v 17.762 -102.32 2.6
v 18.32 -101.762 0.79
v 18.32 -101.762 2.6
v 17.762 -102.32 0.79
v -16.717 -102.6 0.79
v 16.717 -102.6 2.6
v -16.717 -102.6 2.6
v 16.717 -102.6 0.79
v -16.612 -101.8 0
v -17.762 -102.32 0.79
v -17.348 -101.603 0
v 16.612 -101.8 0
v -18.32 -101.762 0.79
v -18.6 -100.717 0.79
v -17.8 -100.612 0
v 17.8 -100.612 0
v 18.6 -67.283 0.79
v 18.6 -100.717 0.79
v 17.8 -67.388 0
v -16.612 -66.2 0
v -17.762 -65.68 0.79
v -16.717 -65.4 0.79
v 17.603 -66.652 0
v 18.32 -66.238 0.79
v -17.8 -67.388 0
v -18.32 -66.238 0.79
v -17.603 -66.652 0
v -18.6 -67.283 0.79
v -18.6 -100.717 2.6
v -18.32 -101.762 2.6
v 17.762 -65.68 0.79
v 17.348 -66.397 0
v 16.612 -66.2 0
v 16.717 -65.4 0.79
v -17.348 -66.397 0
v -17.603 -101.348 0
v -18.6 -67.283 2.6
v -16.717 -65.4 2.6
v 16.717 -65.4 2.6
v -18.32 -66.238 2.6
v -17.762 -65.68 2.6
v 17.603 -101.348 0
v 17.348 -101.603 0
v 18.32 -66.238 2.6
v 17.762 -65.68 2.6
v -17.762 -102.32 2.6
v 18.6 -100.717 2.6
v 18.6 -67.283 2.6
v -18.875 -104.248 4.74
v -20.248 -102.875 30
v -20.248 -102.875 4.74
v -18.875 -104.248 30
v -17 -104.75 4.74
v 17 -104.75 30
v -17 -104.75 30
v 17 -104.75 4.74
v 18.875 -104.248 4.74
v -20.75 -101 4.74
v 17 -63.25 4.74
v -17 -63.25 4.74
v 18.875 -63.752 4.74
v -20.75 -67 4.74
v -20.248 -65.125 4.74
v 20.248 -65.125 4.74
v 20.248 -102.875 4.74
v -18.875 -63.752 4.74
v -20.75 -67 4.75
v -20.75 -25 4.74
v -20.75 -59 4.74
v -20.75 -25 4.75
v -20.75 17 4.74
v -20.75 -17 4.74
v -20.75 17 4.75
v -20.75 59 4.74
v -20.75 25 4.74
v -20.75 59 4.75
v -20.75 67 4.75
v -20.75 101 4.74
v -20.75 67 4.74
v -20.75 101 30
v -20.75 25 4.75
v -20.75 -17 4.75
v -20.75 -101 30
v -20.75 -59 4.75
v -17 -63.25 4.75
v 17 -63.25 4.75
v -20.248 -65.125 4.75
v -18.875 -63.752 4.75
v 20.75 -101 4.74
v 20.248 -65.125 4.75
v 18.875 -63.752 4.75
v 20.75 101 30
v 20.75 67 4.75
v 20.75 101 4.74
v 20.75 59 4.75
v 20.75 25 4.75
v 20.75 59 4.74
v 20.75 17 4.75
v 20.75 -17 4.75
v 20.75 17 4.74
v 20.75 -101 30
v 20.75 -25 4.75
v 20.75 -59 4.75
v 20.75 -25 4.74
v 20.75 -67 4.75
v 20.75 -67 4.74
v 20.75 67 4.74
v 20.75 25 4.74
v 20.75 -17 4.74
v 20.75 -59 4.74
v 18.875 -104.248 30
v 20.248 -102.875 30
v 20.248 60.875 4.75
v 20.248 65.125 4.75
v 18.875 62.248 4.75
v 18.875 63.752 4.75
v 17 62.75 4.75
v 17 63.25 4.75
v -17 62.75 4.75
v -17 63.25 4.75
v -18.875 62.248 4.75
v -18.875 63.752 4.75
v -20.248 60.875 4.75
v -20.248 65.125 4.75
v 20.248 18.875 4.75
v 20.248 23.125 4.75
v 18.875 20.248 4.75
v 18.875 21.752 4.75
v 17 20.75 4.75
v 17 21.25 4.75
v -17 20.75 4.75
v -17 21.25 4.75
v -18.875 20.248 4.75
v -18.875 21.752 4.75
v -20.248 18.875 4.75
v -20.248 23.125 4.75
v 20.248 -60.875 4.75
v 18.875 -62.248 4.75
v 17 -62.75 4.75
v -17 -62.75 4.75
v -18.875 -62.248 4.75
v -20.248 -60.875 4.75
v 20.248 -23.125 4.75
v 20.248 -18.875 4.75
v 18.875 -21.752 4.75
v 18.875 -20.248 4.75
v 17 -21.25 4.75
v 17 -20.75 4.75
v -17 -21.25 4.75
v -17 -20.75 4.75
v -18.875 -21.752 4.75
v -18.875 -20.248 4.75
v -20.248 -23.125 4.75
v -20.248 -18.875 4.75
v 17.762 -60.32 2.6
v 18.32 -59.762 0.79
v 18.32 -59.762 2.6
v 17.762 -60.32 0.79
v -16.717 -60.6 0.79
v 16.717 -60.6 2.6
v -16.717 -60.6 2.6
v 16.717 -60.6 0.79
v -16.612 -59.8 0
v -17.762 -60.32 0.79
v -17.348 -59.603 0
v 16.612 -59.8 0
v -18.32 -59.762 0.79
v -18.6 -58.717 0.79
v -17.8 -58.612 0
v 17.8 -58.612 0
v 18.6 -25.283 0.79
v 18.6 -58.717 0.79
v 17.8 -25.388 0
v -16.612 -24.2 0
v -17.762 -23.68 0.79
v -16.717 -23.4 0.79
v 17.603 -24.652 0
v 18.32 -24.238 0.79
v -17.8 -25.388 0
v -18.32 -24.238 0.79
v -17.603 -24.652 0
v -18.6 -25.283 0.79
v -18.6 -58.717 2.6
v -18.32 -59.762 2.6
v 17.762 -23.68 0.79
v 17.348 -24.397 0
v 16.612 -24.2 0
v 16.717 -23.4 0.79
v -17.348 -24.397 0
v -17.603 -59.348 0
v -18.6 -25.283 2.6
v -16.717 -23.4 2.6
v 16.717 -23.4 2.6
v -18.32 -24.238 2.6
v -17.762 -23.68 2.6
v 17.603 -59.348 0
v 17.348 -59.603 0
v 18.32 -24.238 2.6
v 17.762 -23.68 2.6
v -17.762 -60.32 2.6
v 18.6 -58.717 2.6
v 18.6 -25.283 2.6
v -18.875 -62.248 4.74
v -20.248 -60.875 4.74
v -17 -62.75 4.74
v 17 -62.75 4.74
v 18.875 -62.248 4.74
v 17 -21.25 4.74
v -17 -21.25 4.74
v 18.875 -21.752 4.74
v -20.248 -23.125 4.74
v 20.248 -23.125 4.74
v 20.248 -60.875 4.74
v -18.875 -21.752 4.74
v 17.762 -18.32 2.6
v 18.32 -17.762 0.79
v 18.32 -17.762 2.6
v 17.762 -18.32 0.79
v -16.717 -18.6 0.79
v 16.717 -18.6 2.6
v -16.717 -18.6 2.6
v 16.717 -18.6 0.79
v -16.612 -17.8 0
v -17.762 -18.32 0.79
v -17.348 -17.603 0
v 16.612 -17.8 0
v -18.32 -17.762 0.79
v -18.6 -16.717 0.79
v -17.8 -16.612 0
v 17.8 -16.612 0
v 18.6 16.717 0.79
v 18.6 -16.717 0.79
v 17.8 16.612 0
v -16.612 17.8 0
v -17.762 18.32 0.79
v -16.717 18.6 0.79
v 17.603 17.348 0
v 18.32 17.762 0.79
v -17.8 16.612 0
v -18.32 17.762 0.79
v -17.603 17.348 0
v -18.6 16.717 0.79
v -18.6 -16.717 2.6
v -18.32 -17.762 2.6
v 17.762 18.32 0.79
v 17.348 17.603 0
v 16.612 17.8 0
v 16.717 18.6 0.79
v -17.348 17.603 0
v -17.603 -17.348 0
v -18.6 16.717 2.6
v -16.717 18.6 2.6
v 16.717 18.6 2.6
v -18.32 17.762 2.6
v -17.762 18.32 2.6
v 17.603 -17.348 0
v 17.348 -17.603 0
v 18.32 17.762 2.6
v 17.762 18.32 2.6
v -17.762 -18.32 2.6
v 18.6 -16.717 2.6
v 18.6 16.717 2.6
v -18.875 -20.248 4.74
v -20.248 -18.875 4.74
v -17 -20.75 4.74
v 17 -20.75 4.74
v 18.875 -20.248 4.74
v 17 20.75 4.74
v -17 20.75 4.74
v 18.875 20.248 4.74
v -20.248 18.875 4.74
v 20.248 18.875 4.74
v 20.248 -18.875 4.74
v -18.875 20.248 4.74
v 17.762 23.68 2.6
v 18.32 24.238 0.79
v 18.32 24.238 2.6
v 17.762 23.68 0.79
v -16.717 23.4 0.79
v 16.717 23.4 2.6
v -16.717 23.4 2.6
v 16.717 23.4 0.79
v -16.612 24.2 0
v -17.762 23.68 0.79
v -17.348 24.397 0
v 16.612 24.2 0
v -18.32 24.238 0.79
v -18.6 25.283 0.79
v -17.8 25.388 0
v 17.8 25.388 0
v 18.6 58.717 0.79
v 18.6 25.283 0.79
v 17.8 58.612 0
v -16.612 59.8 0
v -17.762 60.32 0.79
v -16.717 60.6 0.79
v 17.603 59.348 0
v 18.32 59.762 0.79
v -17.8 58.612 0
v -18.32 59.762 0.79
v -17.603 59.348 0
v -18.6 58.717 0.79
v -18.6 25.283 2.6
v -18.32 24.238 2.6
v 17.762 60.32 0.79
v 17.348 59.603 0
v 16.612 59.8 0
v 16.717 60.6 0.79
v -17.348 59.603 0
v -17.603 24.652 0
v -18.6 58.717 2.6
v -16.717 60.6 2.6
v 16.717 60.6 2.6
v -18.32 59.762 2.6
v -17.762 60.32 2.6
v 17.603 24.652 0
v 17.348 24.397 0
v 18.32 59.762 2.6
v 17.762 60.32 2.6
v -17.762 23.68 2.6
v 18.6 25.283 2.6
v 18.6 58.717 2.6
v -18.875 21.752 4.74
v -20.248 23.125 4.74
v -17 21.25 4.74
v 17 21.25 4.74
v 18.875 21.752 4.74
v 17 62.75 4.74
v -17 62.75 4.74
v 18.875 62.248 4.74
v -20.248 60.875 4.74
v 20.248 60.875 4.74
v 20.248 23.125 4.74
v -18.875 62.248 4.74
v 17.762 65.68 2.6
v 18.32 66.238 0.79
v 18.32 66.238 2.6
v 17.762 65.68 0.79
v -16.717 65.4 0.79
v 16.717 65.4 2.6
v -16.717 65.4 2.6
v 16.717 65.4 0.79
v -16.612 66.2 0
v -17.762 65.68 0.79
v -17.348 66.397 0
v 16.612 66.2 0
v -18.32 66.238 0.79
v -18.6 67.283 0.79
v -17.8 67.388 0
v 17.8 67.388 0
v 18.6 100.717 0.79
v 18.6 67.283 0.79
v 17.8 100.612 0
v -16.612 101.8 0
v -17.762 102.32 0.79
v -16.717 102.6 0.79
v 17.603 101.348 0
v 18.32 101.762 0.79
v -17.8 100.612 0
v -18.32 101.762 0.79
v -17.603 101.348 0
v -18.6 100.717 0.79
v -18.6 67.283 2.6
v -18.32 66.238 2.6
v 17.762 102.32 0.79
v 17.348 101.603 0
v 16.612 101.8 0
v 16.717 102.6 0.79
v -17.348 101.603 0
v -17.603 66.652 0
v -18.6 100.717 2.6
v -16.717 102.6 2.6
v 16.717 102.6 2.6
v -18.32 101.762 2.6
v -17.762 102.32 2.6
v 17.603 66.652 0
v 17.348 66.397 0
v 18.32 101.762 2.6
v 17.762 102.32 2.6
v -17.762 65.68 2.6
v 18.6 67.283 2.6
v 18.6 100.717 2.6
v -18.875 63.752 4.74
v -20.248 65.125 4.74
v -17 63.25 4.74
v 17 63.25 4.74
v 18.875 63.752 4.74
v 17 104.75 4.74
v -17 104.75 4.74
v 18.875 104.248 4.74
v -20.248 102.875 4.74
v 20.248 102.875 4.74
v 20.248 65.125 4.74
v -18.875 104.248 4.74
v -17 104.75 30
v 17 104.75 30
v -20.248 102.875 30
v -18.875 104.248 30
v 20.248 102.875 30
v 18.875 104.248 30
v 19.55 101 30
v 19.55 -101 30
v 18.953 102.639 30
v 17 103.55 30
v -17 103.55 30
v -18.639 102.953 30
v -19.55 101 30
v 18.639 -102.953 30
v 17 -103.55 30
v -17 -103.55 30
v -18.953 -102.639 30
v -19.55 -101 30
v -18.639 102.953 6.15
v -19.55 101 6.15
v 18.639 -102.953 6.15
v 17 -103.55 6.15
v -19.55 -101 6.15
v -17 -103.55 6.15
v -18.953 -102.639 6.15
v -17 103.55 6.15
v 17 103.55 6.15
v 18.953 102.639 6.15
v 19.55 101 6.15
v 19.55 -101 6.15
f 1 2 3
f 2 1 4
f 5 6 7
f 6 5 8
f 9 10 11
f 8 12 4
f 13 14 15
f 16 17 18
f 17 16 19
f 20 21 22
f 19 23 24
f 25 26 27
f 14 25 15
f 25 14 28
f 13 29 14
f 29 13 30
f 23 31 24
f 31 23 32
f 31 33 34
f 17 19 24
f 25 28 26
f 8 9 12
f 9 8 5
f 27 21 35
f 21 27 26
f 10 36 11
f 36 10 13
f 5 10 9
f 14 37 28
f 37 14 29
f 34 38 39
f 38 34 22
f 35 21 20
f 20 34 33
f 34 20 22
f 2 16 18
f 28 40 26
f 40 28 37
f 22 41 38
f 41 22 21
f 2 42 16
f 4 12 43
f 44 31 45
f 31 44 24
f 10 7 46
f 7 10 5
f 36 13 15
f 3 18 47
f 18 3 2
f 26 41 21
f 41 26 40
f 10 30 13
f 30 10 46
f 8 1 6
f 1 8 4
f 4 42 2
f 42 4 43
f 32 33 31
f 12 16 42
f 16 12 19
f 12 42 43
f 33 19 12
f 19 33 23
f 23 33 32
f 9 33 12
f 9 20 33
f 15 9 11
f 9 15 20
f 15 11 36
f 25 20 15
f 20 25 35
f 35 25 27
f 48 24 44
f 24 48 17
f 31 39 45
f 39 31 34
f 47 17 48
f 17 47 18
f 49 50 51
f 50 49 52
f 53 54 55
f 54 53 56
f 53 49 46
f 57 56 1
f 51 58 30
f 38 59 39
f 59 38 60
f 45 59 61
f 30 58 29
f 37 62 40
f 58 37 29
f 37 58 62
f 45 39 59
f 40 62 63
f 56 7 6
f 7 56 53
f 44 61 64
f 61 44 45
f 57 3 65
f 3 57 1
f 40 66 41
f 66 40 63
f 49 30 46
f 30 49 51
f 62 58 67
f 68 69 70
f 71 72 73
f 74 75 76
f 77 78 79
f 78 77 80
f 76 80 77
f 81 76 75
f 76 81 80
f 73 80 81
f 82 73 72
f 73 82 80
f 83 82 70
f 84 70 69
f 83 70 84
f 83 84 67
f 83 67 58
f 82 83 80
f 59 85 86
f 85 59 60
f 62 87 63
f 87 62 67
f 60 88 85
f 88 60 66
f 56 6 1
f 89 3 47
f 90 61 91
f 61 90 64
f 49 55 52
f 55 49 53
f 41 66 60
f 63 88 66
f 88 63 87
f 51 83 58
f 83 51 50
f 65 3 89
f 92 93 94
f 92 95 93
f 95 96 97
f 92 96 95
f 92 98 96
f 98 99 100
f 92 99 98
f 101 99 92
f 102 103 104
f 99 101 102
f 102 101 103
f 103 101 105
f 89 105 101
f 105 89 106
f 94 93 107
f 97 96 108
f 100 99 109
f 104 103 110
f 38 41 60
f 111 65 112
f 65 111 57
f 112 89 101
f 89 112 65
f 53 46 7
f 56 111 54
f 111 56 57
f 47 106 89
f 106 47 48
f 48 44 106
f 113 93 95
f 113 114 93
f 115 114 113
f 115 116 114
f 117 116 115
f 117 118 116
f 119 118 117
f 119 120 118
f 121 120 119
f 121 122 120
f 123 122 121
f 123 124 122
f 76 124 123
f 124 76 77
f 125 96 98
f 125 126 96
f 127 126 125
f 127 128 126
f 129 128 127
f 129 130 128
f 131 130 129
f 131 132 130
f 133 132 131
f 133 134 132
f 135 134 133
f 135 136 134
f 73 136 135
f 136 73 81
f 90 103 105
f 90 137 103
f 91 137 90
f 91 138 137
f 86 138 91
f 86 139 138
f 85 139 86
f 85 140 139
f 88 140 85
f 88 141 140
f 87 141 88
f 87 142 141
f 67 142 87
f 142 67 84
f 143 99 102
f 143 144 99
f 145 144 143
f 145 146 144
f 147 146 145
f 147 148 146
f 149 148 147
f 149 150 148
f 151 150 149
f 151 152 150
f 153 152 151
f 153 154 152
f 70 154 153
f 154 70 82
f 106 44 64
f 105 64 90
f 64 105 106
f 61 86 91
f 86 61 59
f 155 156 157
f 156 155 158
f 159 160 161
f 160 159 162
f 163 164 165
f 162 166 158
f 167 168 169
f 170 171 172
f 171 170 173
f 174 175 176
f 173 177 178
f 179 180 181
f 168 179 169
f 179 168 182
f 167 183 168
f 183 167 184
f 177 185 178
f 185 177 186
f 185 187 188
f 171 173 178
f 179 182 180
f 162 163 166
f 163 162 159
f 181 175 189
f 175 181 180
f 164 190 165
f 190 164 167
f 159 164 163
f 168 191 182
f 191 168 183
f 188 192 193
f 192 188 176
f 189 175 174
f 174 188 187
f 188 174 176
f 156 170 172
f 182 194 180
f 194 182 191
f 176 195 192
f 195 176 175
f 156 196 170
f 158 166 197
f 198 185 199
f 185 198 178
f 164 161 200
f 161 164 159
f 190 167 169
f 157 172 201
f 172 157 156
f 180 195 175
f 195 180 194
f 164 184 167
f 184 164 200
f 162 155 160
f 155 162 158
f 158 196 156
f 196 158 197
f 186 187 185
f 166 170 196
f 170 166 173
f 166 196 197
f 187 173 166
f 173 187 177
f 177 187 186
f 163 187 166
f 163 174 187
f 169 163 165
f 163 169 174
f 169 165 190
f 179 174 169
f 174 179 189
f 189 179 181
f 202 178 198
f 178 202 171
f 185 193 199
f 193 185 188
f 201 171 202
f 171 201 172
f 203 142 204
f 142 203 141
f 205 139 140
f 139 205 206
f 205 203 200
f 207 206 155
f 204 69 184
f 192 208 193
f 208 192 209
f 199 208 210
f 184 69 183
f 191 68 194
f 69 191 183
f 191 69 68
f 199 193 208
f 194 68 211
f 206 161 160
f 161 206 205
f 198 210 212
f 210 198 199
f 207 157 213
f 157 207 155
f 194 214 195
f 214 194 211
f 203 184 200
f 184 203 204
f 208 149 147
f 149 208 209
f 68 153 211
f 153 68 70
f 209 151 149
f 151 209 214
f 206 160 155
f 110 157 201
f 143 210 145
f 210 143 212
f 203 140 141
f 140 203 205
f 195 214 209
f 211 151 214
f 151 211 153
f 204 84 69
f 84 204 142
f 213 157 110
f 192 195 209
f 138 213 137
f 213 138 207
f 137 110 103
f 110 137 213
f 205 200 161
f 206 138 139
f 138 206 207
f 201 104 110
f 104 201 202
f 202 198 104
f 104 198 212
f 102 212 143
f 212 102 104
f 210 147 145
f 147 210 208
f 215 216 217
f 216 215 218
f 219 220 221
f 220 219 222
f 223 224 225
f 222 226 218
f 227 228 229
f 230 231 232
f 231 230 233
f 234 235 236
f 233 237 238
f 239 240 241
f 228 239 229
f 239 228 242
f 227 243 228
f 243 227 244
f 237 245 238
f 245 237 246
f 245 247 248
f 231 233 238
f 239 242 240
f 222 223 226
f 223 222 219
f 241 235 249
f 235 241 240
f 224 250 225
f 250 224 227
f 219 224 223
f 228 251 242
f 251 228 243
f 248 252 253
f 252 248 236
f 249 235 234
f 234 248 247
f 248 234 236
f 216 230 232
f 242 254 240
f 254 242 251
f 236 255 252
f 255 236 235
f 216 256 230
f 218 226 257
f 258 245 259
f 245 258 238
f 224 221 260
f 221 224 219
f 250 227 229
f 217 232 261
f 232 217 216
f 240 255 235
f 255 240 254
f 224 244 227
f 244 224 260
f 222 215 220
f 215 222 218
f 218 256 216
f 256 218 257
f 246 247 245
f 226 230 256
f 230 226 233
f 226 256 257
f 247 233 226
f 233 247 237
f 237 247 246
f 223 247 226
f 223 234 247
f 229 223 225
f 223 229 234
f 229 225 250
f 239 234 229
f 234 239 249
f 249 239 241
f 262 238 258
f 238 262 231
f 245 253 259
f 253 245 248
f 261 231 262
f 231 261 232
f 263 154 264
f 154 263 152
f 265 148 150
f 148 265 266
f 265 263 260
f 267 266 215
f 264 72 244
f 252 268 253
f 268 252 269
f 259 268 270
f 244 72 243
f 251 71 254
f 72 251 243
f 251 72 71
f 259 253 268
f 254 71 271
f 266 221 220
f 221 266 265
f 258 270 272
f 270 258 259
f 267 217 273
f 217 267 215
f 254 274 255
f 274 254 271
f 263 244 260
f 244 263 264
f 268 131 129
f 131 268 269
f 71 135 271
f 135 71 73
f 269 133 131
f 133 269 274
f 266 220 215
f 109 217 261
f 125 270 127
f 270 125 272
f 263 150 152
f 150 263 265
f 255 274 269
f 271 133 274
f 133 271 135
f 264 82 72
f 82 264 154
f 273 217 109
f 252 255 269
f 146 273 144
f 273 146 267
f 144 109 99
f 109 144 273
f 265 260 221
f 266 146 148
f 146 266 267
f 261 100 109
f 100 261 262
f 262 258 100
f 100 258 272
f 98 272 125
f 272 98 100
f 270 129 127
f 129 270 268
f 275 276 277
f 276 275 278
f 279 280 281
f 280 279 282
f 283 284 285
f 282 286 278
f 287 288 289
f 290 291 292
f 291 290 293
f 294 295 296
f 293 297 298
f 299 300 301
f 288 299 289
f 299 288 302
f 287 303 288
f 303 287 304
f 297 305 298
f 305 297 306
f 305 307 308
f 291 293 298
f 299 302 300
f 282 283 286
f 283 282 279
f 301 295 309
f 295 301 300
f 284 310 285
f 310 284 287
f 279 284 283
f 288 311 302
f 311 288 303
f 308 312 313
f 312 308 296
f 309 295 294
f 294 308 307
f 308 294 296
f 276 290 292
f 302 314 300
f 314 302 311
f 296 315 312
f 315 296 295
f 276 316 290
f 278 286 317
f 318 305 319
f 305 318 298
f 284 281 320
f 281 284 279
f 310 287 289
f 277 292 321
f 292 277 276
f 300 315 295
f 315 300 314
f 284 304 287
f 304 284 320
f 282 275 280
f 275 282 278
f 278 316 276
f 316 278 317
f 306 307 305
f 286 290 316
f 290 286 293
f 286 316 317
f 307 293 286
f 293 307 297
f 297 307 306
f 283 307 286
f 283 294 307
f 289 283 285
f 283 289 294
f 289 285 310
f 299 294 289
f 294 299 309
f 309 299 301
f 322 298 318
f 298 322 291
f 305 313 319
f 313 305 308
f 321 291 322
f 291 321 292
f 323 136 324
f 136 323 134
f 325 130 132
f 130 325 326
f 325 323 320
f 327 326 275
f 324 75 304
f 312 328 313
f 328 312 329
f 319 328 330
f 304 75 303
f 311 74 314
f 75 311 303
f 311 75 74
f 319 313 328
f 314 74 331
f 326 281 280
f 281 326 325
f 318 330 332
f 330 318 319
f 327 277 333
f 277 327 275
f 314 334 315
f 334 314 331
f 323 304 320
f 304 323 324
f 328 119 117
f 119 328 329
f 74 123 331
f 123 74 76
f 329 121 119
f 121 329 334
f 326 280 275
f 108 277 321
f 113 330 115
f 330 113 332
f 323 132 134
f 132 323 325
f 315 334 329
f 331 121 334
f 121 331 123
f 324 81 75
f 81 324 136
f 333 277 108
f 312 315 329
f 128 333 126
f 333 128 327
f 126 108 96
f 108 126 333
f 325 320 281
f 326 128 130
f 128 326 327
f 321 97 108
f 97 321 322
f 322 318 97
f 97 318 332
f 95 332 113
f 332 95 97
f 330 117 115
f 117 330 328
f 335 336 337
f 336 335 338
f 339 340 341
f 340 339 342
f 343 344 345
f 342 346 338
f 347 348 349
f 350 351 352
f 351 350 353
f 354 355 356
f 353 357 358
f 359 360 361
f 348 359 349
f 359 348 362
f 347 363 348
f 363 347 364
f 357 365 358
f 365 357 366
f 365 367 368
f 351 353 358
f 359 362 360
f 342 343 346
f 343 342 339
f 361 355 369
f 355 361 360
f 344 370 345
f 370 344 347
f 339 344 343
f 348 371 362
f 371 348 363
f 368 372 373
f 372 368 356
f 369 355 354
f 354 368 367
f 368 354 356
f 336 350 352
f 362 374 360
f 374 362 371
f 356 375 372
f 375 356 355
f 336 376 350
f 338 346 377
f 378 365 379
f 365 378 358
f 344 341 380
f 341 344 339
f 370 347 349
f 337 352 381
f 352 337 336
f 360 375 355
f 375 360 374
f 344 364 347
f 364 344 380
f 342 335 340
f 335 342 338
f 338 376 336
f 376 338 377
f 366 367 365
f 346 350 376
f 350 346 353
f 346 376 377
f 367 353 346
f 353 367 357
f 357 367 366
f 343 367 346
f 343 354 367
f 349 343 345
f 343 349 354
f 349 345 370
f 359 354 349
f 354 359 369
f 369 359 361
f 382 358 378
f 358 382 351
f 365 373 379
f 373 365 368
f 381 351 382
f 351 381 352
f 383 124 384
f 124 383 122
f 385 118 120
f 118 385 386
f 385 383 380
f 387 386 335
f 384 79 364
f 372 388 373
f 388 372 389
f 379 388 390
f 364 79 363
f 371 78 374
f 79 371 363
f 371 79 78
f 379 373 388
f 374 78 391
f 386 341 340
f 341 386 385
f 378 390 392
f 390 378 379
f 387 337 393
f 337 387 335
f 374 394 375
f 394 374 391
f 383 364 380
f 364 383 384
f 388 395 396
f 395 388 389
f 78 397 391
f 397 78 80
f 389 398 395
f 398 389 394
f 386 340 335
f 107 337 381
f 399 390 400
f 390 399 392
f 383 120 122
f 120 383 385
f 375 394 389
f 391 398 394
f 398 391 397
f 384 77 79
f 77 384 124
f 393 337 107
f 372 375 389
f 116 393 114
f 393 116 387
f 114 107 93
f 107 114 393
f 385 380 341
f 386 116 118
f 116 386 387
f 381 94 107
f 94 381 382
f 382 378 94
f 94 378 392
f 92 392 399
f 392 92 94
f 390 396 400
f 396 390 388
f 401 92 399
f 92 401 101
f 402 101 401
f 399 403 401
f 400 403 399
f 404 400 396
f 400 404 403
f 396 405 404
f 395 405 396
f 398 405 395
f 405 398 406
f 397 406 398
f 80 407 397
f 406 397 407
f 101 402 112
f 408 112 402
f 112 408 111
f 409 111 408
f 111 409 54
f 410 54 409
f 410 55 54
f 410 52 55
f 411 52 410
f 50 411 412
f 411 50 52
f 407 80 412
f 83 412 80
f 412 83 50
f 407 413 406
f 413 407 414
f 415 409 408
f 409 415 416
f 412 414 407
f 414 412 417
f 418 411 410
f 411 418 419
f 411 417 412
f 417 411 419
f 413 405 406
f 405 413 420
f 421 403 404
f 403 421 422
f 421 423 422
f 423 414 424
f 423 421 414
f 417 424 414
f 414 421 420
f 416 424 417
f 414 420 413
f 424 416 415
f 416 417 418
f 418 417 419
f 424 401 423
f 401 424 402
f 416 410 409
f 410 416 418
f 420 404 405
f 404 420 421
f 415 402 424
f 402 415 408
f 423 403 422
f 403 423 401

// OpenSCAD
// bin_chip_remover — 1×5 trough for the chip-removal alloy tube.
//
// A plain bin, not a shaped cradle: it is a rigid tube with walls around it, and
// a contoured channel would only matter if it needed to sit in one orientation.
//
// PRINT: as emitted, feet down. No supports.
include <../lib/gridfinity.scad>

TUBE_H = 30;   // [16:1:60] bin height. Raise if the tube stands proud of the rim.

bin(1, 5, TUBE_H);
